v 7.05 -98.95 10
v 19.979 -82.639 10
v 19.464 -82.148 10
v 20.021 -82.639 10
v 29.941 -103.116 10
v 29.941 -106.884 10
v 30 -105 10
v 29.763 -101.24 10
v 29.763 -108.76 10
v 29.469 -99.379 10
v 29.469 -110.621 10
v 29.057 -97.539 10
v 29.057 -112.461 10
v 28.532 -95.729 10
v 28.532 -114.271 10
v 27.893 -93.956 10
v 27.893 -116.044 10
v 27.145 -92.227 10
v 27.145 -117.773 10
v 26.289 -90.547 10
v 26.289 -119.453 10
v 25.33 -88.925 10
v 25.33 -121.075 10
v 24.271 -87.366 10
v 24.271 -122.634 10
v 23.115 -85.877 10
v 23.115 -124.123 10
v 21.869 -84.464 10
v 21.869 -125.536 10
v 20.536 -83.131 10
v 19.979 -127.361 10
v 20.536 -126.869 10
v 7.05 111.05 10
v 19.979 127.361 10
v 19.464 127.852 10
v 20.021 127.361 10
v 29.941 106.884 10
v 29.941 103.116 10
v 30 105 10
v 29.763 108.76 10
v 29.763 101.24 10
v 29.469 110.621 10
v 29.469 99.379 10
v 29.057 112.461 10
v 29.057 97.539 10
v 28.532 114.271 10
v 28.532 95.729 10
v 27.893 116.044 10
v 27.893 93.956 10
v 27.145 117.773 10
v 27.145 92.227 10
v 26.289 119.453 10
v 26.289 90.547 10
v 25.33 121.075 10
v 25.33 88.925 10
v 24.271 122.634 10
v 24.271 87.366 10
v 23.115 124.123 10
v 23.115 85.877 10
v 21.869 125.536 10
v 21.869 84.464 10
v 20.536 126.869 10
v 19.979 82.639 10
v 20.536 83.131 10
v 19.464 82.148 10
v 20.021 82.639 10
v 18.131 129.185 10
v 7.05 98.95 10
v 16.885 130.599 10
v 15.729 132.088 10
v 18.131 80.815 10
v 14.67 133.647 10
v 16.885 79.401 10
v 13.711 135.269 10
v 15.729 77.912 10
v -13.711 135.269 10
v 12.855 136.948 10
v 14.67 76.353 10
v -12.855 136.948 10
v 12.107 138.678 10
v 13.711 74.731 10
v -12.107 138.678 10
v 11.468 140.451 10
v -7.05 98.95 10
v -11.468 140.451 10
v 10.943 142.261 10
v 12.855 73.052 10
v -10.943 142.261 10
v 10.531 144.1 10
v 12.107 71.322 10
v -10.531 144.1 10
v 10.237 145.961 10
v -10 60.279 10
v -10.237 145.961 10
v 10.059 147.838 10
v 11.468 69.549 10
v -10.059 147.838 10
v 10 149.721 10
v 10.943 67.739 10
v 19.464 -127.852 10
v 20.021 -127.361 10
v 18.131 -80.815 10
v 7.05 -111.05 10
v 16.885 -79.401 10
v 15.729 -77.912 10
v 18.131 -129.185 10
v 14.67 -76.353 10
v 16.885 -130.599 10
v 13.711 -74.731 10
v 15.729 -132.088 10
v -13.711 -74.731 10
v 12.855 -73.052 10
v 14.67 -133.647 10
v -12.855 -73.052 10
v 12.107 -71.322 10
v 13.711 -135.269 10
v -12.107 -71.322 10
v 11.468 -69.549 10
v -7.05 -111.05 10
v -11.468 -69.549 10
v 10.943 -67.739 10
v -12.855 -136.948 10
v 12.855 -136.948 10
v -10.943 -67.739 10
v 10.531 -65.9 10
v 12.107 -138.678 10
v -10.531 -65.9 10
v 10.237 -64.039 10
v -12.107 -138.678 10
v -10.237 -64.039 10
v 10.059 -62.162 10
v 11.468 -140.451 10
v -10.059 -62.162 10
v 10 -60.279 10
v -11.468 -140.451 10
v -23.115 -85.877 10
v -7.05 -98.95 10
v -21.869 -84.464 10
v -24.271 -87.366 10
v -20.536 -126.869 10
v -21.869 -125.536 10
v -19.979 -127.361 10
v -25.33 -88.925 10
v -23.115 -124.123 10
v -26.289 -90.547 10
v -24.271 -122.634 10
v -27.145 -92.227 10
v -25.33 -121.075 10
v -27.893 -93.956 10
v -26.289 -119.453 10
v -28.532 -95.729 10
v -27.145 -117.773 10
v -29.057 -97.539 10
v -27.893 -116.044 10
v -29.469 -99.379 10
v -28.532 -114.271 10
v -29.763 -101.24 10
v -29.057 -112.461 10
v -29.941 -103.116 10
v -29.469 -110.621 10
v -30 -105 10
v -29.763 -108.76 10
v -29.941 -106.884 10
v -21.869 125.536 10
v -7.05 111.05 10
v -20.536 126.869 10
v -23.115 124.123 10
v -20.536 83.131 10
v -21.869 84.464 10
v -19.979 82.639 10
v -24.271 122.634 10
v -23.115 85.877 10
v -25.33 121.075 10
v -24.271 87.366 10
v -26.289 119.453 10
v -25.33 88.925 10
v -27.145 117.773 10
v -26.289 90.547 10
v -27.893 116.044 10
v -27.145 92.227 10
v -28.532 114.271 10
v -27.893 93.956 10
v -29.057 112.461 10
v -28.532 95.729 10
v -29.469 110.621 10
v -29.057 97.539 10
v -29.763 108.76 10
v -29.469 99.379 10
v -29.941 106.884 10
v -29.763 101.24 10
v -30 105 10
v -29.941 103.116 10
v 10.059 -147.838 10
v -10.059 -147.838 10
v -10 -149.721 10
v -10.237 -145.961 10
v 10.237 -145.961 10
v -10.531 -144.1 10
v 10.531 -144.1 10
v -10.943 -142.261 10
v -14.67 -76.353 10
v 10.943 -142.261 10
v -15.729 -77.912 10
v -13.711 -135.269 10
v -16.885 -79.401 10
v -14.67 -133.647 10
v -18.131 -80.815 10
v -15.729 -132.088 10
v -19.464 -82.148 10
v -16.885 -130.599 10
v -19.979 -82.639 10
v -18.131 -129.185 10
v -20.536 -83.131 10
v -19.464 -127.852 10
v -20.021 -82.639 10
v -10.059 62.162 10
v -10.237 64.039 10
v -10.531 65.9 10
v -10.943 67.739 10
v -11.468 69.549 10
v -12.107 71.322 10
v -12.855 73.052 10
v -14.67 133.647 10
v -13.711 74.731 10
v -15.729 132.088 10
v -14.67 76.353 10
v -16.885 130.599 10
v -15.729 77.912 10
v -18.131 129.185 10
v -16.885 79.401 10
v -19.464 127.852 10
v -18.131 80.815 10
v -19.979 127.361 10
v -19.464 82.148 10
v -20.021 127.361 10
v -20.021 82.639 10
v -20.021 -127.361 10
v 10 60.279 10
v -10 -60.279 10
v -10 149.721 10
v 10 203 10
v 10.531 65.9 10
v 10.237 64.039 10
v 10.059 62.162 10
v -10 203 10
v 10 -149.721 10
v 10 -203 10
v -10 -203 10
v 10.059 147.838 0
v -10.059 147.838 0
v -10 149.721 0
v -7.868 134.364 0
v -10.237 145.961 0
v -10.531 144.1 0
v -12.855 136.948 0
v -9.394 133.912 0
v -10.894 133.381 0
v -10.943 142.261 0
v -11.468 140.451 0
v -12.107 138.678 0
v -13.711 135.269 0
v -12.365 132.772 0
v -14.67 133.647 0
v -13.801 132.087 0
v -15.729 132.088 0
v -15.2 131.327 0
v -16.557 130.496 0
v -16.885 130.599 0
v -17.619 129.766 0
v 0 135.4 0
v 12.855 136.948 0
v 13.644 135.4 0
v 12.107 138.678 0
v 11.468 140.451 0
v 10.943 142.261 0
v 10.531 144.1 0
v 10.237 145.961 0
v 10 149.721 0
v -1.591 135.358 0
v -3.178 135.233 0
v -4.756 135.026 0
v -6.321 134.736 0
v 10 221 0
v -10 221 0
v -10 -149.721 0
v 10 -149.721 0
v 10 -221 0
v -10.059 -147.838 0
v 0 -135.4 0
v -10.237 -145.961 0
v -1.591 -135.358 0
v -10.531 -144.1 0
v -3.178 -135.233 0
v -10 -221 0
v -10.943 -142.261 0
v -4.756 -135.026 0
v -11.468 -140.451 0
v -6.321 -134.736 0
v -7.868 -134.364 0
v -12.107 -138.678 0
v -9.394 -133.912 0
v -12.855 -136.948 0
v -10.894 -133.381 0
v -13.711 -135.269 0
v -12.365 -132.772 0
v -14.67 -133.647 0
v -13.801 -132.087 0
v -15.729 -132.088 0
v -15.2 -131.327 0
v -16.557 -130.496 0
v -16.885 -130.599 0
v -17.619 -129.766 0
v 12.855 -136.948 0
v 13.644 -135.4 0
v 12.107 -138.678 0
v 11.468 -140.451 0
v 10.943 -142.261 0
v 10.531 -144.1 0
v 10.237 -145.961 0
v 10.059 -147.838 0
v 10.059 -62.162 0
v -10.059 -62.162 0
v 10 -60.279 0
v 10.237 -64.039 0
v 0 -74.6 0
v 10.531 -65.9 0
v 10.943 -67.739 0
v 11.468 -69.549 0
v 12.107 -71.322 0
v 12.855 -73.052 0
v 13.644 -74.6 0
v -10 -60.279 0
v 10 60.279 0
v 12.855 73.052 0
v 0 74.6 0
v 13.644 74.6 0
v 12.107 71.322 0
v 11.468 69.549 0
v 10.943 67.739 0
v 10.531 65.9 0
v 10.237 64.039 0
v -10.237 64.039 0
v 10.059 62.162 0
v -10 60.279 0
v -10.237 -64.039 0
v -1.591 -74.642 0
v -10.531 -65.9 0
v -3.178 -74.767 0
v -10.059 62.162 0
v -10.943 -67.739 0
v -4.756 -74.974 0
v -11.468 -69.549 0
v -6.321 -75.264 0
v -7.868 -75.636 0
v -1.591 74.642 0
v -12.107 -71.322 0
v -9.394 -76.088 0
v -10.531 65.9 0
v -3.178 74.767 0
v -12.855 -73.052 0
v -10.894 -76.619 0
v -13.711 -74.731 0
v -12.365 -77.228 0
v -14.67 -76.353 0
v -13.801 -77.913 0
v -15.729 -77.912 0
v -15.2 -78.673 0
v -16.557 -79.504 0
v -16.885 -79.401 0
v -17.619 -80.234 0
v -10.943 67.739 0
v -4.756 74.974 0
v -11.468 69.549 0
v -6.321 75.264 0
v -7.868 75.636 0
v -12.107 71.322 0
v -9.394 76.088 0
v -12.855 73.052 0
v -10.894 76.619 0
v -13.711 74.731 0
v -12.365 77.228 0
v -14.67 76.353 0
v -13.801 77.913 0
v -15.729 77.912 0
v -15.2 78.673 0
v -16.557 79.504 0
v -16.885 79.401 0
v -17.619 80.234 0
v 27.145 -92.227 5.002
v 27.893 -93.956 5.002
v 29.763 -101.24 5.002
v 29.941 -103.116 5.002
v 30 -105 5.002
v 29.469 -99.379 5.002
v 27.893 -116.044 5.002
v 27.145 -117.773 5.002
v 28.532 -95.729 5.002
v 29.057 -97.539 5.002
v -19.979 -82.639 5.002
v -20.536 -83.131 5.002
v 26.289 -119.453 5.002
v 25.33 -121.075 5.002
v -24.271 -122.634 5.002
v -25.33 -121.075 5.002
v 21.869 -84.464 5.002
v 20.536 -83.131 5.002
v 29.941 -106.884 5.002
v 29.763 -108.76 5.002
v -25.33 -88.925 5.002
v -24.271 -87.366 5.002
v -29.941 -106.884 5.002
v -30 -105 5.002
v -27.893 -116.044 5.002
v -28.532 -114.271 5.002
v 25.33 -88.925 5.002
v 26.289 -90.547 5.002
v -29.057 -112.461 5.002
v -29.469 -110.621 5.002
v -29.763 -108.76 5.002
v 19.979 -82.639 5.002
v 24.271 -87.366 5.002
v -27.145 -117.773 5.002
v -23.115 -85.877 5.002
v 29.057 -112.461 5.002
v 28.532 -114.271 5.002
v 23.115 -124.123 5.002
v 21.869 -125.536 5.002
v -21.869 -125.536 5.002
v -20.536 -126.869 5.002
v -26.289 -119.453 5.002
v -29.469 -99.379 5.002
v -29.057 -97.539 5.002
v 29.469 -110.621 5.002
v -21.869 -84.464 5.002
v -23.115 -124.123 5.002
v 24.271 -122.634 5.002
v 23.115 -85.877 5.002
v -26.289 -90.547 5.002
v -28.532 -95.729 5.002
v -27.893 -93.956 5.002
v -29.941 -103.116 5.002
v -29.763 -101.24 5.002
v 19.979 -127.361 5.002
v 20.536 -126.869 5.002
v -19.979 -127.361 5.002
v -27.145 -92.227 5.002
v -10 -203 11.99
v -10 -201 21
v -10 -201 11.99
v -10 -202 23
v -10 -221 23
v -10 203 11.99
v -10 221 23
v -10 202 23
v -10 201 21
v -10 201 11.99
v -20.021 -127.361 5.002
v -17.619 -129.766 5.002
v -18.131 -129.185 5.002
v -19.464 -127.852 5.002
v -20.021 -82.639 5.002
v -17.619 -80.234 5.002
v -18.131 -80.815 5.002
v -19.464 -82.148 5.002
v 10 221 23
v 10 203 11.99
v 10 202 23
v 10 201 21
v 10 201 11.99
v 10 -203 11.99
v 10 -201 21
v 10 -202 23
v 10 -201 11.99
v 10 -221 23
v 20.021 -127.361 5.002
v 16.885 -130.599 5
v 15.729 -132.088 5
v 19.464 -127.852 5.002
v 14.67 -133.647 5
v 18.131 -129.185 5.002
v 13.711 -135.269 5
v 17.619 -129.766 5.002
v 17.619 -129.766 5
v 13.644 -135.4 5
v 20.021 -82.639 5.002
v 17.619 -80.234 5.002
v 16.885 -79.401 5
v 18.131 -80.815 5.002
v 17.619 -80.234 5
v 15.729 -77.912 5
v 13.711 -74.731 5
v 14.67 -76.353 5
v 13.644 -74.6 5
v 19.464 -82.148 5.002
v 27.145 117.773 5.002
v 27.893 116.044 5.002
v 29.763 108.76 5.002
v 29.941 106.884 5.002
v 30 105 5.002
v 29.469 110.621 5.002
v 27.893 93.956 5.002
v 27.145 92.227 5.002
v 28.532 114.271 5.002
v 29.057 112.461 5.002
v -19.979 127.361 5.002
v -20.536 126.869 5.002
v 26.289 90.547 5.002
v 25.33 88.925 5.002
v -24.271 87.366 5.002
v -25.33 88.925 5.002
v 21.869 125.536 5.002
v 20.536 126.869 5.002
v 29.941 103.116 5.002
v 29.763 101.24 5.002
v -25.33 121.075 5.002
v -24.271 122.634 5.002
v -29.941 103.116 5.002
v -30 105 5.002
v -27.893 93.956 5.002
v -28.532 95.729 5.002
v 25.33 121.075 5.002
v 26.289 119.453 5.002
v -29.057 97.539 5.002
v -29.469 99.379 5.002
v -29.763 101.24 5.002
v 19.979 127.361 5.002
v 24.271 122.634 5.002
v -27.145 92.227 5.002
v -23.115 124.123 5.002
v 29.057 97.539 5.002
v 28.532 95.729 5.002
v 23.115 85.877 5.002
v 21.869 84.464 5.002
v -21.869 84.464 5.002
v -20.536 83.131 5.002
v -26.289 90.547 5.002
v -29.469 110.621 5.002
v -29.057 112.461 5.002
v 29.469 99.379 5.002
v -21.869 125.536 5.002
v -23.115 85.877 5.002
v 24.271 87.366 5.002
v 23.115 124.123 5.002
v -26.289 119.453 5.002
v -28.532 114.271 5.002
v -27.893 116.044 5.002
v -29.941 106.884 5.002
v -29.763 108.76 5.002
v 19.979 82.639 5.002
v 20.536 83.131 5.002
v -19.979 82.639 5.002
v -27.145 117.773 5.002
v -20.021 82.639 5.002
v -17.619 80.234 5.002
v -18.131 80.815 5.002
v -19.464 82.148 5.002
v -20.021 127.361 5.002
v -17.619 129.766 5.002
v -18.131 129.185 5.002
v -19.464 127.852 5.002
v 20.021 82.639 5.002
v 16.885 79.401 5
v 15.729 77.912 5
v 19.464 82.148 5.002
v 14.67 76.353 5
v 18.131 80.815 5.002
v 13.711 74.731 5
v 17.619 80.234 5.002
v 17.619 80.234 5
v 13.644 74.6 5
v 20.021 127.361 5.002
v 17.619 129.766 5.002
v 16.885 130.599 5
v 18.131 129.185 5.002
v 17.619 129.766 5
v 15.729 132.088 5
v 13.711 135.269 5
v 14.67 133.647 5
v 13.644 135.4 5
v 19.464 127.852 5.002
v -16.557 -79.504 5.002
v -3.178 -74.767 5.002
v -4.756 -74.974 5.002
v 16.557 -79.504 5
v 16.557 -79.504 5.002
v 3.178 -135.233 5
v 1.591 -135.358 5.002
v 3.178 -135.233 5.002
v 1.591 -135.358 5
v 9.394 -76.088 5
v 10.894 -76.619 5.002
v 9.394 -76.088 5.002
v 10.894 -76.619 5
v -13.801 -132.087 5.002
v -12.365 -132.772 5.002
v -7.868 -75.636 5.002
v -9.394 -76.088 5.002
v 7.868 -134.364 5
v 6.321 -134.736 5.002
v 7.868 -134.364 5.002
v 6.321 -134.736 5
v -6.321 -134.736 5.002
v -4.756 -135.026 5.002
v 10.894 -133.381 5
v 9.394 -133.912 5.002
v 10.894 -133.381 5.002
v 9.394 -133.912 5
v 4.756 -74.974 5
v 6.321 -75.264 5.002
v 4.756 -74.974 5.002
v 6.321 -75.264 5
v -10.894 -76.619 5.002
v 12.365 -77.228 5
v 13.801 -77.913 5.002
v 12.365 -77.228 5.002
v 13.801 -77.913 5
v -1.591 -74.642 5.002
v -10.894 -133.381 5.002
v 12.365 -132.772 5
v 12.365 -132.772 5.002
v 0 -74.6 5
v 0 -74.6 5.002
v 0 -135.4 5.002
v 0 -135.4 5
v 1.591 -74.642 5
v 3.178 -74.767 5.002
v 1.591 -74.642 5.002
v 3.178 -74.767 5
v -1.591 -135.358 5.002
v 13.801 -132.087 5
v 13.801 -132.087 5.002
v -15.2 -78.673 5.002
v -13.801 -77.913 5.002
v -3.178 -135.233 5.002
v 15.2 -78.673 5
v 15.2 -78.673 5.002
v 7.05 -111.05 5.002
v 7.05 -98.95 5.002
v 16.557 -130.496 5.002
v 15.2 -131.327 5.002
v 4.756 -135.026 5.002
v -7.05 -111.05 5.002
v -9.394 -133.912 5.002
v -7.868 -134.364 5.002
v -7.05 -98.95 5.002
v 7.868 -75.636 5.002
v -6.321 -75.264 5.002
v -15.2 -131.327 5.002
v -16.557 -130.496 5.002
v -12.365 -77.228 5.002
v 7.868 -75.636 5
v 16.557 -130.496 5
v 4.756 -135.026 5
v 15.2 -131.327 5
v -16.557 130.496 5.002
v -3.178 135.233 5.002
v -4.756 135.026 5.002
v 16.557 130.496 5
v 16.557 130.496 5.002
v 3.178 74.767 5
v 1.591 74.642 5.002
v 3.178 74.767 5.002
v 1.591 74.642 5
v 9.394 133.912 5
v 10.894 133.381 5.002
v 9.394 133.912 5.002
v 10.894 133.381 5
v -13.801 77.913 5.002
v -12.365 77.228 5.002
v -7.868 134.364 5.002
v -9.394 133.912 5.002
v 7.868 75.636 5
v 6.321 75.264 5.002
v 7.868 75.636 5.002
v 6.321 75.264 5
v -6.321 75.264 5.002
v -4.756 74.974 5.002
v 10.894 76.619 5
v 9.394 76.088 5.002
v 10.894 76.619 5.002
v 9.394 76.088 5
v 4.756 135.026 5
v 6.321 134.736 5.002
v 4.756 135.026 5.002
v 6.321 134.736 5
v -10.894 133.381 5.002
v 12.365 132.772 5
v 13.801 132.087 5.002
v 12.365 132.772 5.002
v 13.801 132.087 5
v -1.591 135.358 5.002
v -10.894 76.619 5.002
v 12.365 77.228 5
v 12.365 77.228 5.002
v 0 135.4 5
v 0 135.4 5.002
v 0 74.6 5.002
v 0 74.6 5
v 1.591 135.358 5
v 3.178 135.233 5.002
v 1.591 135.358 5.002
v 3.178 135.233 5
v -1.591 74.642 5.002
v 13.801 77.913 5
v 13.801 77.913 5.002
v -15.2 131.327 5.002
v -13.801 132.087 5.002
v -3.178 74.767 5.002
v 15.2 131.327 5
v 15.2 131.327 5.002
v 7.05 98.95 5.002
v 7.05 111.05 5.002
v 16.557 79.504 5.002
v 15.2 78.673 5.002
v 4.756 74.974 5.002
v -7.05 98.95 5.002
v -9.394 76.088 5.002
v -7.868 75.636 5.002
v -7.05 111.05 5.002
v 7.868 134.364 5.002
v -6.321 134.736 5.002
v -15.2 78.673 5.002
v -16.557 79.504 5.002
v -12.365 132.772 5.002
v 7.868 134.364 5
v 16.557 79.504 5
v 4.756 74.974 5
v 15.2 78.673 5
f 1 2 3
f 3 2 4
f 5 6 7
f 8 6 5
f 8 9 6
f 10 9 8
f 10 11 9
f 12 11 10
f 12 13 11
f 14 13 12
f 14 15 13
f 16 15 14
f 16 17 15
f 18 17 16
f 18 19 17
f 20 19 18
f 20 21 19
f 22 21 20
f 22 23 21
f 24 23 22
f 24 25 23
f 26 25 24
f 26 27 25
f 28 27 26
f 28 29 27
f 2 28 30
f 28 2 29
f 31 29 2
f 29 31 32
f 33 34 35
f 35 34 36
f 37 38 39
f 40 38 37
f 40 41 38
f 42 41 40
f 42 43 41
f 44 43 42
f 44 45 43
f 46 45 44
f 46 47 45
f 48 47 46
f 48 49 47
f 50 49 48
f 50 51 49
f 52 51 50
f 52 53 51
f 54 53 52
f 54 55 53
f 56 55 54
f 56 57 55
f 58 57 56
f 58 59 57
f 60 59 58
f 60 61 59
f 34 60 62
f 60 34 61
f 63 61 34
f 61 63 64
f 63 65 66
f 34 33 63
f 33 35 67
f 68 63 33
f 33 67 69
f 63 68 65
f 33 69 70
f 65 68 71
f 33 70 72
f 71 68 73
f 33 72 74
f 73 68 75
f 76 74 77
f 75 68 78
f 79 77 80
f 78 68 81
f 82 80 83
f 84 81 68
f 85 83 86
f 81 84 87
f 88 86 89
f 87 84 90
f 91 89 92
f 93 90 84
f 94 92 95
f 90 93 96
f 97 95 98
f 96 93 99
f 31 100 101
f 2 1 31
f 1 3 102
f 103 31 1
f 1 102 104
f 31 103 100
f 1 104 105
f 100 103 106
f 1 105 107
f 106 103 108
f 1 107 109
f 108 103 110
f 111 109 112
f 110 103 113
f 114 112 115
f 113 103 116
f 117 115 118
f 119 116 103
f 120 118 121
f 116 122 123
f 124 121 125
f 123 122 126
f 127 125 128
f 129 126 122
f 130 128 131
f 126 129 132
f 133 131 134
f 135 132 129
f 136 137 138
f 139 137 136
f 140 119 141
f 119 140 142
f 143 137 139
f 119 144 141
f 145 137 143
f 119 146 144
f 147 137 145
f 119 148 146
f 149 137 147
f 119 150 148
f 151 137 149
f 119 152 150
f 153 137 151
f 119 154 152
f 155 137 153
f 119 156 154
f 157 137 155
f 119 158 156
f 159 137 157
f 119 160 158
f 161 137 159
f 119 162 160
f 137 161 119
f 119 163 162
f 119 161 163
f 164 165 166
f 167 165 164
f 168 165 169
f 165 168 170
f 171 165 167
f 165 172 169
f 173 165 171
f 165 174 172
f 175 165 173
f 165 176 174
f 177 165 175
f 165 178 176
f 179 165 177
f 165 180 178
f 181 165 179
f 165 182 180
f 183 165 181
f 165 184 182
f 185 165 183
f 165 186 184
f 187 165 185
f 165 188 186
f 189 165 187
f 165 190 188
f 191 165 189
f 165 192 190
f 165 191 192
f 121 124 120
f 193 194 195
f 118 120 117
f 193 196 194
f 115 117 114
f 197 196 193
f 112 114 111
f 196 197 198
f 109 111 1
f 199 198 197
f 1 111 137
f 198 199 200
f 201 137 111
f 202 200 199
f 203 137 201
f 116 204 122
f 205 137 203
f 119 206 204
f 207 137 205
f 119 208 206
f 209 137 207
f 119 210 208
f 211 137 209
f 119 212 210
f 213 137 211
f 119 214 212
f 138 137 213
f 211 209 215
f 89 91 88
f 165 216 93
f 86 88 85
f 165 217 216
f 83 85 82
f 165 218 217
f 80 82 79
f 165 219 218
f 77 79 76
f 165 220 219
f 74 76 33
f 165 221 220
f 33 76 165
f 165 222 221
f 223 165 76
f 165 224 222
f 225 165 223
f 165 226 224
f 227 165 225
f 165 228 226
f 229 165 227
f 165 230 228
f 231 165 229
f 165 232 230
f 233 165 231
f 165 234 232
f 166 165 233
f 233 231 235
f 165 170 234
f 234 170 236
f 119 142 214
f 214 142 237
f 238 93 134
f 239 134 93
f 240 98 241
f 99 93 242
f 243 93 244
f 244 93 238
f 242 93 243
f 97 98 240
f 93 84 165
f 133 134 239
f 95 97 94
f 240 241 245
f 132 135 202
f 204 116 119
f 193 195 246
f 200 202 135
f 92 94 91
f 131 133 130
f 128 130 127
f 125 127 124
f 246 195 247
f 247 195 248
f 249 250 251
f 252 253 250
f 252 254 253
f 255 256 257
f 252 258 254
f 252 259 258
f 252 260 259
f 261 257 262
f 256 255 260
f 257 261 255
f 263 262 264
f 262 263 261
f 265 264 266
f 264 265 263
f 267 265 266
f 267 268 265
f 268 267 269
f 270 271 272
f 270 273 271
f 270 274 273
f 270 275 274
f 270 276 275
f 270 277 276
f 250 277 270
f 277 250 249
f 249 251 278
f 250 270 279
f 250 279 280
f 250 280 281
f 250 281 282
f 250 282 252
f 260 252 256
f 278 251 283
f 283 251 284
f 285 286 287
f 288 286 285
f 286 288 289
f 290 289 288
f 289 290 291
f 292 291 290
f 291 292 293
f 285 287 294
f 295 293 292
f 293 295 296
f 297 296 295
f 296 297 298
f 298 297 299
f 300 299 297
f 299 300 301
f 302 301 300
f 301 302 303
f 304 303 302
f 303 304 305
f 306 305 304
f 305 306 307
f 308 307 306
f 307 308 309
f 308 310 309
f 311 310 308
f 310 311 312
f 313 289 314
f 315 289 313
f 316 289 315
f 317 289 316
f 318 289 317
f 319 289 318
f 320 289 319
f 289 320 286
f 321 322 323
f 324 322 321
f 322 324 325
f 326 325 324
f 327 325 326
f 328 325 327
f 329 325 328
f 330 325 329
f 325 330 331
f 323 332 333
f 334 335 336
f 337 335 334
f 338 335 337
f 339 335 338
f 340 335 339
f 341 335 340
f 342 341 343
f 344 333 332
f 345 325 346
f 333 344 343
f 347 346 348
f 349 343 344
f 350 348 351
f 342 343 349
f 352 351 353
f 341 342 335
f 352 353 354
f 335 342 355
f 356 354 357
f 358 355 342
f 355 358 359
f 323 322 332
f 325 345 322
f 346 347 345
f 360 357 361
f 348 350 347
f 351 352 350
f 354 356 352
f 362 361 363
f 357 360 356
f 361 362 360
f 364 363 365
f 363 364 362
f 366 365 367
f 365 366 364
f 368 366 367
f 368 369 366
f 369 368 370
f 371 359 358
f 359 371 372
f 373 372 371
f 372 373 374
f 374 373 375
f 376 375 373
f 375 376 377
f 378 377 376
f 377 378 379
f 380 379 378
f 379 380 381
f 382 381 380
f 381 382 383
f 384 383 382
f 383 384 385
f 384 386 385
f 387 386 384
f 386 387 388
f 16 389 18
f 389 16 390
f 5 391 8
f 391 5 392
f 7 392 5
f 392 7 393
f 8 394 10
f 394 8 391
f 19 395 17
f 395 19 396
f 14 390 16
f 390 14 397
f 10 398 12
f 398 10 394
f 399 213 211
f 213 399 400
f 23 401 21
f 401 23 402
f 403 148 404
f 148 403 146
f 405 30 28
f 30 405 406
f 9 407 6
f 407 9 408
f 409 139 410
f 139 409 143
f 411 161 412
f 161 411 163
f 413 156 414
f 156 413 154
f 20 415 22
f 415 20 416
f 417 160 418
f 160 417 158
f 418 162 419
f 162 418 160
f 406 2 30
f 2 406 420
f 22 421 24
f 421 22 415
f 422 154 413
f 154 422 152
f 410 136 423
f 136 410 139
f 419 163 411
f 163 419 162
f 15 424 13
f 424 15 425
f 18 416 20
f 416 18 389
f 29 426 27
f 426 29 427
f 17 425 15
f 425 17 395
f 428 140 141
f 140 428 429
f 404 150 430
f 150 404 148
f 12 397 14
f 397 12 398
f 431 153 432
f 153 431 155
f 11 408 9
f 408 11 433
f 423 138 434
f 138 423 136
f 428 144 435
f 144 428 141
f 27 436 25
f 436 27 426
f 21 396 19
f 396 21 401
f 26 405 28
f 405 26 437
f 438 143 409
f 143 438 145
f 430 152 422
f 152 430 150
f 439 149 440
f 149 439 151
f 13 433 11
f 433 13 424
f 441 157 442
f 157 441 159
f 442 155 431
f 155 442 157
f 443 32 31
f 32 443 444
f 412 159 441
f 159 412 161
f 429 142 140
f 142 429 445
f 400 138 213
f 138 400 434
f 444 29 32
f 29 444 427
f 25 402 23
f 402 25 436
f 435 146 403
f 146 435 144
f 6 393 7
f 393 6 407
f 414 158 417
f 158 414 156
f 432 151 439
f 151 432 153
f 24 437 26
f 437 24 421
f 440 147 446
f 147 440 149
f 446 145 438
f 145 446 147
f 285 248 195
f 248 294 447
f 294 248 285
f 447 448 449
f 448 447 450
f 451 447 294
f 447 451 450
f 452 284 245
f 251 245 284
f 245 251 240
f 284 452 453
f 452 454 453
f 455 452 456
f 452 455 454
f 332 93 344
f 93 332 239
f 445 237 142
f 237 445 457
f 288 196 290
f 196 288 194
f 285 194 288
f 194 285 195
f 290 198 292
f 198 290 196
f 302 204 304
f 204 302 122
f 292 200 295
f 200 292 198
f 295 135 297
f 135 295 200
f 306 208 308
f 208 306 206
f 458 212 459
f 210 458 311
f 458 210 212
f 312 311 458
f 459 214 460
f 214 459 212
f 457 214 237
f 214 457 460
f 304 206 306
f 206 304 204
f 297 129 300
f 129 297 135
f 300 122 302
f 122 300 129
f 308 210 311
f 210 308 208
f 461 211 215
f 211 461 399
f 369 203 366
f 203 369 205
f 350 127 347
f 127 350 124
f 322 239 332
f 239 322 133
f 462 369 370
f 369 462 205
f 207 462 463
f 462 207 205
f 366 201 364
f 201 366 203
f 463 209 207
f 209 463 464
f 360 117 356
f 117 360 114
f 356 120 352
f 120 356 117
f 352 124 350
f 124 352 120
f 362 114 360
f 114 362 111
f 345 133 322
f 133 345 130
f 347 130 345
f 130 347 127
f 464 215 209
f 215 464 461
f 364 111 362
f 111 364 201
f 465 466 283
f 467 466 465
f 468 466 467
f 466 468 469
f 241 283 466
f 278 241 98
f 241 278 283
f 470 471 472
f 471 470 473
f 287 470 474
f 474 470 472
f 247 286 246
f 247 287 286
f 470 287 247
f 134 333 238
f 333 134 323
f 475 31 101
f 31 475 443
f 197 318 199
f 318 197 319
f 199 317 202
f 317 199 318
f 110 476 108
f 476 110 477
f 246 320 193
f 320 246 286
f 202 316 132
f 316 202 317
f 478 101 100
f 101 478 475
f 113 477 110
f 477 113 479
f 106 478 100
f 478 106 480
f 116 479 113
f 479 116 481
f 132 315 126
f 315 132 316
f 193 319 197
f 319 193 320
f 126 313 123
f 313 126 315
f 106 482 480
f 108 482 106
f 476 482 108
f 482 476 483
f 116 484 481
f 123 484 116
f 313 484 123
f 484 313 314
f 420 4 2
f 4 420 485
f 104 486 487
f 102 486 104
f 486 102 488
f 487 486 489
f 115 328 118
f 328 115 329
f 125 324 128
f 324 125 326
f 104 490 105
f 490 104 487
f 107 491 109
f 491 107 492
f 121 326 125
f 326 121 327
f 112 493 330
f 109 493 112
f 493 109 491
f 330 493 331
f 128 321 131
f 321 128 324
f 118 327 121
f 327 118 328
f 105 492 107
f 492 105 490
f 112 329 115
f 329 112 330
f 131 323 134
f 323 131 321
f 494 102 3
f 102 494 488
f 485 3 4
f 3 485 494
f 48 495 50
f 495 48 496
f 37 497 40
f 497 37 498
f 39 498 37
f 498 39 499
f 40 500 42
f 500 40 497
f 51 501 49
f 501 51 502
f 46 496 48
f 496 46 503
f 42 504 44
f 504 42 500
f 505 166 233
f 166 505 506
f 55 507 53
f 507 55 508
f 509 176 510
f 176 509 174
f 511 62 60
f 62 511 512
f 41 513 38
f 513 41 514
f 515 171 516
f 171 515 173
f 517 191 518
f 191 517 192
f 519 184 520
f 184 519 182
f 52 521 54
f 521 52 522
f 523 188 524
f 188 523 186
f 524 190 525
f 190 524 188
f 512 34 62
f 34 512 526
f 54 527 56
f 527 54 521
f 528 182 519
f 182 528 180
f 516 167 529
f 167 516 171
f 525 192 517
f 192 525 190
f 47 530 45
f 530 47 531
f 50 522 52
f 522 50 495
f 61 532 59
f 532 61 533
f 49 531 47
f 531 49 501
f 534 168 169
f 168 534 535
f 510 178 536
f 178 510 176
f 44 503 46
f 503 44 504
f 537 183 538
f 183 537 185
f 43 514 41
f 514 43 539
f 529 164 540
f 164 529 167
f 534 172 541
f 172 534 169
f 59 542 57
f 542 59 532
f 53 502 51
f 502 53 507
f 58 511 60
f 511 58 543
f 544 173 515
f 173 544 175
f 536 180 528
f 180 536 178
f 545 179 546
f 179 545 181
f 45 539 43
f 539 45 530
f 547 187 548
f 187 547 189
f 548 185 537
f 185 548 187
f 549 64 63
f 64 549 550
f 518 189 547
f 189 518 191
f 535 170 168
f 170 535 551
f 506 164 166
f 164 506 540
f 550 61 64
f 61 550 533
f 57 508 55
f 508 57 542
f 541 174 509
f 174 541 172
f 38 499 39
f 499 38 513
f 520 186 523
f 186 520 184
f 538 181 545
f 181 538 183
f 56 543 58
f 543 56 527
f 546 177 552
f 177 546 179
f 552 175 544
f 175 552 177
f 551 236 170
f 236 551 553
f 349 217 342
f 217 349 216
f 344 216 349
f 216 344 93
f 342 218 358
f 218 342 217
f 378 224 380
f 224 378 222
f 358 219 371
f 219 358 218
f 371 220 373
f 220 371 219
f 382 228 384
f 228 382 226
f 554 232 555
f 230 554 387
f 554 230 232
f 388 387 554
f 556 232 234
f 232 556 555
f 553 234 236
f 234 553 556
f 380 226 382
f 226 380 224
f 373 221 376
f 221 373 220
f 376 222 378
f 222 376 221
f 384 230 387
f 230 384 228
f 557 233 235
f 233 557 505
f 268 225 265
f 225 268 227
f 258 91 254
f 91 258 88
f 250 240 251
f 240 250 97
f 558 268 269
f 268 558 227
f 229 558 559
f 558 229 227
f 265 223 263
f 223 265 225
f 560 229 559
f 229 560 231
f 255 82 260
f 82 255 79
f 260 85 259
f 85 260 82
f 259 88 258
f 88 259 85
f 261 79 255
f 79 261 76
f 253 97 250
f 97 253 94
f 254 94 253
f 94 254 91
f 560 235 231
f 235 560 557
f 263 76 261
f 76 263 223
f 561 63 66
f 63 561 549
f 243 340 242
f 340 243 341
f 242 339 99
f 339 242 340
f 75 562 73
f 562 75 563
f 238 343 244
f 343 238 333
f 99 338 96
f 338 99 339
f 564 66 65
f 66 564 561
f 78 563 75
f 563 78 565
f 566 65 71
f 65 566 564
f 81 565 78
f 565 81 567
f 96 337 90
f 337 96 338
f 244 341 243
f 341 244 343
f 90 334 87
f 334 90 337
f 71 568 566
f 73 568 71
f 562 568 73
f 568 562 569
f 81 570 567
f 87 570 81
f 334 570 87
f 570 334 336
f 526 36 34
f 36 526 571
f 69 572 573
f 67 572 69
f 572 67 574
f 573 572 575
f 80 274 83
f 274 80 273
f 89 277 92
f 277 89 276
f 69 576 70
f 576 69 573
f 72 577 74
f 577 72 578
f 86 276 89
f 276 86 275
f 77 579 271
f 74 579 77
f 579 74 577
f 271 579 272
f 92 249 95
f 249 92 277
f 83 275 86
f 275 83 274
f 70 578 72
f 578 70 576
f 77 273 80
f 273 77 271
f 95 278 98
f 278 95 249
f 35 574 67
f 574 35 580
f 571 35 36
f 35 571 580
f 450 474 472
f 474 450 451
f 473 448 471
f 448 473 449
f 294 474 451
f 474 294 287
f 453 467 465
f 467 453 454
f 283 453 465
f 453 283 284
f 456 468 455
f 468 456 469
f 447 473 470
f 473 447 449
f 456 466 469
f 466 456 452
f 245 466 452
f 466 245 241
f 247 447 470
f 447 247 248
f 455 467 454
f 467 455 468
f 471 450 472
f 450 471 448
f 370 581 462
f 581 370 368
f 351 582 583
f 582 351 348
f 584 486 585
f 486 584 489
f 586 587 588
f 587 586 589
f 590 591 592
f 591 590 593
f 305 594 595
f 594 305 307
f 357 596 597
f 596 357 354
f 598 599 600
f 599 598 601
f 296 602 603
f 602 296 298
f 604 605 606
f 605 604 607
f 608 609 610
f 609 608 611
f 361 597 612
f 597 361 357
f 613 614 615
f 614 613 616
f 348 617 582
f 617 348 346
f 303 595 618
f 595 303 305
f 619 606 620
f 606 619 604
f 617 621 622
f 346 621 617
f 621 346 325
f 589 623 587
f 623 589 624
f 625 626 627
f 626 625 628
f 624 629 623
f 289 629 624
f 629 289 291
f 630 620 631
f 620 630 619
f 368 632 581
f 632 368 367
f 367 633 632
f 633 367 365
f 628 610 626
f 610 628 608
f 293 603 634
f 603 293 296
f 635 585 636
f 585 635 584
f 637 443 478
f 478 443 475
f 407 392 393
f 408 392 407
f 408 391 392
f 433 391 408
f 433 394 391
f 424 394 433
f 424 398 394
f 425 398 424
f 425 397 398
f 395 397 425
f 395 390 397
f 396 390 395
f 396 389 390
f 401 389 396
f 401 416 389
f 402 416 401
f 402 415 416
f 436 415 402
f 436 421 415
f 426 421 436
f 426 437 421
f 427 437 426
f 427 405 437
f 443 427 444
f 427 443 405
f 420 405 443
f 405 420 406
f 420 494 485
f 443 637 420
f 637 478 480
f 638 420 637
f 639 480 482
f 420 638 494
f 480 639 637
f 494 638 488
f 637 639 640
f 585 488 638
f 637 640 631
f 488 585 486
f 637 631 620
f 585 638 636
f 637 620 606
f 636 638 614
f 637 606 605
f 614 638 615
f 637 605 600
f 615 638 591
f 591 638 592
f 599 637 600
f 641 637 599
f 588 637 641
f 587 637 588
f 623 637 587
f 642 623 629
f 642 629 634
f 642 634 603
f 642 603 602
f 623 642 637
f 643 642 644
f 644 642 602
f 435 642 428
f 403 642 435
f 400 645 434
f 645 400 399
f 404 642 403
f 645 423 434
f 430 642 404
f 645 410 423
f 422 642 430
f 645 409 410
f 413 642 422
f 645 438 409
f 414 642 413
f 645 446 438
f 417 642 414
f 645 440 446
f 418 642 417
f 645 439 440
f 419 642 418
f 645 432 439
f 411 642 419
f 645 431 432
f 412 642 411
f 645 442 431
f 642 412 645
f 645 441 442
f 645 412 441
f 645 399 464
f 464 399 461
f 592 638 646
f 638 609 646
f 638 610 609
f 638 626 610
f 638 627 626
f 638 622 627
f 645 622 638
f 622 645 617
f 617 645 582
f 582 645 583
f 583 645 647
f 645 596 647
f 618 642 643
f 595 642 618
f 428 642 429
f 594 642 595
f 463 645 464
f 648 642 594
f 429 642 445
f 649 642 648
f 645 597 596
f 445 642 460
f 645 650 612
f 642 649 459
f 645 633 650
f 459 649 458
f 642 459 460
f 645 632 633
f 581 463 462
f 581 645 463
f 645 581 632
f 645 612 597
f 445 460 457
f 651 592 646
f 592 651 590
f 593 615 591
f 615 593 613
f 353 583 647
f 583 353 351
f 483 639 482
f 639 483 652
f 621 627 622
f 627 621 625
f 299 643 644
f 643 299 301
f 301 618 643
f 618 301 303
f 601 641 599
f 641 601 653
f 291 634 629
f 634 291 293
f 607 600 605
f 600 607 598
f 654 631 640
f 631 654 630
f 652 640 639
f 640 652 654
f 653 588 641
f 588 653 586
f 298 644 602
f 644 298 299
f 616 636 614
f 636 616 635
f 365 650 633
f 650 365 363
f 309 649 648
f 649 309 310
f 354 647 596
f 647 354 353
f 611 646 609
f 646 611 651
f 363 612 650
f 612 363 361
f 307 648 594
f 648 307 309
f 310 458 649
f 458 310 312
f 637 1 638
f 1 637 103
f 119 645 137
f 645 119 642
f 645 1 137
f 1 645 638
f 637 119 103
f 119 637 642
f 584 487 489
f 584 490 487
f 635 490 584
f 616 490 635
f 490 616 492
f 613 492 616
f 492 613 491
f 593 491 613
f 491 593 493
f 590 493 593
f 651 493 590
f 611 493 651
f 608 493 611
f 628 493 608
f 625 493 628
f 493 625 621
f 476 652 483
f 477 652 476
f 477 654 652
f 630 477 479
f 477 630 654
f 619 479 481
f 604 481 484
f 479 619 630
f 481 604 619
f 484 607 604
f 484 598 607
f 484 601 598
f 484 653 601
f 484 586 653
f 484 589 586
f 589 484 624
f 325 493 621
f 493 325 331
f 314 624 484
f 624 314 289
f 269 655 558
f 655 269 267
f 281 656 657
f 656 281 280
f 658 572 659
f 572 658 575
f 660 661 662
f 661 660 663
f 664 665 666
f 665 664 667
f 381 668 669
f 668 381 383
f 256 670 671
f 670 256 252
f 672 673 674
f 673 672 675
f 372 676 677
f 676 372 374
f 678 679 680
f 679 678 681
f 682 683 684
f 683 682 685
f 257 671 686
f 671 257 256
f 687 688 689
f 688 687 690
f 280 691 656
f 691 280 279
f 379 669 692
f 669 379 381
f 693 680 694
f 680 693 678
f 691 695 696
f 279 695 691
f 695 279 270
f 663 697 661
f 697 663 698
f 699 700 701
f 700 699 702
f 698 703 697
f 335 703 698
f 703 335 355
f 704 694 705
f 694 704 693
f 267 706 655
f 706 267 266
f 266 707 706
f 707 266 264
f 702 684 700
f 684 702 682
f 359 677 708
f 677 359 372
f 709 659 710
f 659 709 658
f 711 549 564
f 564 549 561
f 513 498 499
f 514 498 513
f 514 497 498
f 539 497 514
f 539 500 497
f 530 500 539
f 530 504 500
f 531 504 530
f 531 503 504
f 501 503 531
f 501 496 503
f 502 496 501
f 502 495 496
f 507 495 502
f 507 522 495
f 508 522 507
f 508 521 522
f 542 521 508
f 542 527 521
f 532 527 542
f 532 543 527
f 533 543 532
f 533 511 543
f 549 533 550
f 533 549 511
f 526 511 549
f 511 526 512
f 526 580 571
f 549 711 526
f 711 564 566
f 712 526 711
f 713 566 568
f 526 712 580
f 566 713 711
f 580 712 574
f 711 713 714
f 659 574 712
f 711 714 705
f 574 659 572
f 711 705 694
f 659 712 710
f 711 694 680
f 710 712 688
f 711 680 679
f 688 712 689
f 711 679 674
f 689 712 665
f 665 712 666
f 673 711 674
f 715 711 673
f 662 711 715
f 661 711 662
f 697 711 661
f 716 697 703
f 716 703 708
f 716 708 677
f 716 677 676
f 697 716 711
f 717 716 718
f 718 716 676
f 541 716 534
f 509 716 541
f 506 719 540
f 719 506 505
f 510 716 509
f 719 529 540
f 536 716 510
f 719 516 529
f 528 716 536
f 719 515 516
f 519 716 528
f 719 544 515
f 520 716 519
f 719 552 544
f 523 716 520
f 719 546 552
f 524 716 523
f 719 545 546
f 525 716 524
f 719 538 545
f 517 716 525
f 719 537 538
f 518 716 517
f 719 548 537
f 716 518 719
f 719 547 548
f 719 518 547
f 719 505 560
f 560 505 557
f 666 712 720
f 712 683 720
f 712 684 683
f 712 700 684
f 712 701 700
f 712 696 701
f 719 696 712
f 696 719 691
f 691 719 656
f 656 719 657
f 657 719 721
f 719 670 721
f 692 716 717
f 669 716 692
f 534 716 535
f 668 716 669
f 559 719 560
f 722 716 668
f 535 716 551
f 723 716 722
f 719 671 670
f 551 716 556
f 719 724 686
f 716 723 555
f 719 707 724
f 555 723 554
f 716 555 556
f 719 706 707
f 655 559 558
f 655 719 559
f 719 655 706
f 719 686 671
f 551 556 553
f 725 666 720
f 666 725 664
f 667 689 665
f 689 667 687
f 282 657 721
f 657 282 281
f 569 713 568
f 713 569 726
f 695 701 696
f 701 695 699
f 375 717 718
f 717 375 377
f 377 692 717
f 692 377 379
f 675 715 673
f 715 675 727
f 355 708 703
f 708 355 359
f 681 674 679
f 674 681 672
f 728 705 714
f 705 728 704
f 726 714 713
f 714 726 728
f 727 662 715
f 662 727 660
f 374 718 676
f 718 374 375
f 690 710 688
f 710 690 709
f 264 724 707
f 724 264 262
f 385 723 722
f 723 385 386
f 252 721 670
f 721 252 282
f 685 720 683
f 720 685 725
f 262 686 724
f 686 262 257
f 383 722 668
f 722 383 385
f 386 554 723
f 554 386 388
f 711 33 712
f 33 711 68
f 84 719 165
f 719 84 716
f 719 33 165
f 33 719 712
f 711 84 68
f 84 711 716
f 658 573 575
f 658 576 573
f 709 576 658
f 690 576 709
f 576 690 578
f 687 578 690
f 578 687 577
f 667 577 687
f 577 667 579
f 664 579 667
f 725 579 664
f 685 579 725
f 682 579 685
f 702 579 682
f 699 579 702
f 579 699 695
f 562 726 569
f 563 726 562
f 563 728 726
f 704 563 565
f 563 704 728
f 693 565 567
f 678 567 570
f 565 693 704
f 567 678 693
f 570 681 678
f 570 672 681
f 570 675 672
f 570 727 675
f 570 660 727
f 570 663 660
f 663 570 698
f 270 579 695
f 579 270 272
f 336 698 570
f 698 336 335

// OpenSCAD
depth = 402;
width = 402;

thickness = 20;
height = 10;

total_bed_height = 11;
constrained_bed_height = 9;

heater_pad_gap = 2;

ease_in_width = 1;
ease_in_height = 2;

screw_offset_x = 185;
screw_offset_y = 105;
screw_hole_diameter = 12;

screw_diameter = 3;

module bar(bar_length, interface_side, crossing_offset, remove_outside_curved_wall)
{
  translate([0, 0, height * 0.5])
  union()
  {
    difference()
    {
      // rounding:
      // * middle circle diameter = 3 * thickness
      // * corner circles diameter = 3 * thickness
      
      intersection()
      {
        union()
        {
          cube([thickness, bar_length + 2 * thickness, height], center = true);
          
          rounding_circle_radius = 1.5 * thickness;
          
          for (bulge_y = [-crossing_offset, crossing_offset])
            translate([0, bulge_y, 0])
            {
              intersection()
              {
                cube([3 * thickness, 3 * thickness, height], center = true);
                cylinder(height + 0.2, rounding_circle_radius, rounding_circle_radius, center = true, $fn = 100);
              }

              rounding_x = 0.5 * thickness + rounding_circle_radius;
              rounding_y = sqrt(4 * rounding_circle_radius * rounding_circle_radius - rounding_x * rounding_x);

              for (dx = [-1, 1])
                for (dy = [-1, 1])
                  difference()
                  {
                    translate([dx * (0.5 * rounding_circle_radius + 0.5 * thickness), dy * rounding_y * 0.75, 0])
                    cube([rounding_circle_radius, 0.5 * rounding_y, height], center = true);
                    
                    translate([dx * rounding_x, dy * rounding_y, 0])
                    cylinder(height + 2.1, rounding_circle_radius, rounding_circle_radius, center = true, $fn = 100);
                  }
            }

          difference()
          {
            union()
            {
              translate([0, -bar_length * 0.5 - thickness * 0.5, 0.5 * total_bed_height + 0.5 * ease_in_height])
              cube([thickness, thickness, height + total_bed_height + ease_in_height], center = true);

              translate([0, bar_length * 0.5 + thickness * 0.5, 0.5 * total_bed_height + 0.5 * ease_in_height])
              cube([thickness, thickness, height + total_bed_height + ease_in_height], center = true);
            }
            
            translate([0, 0, 0.5 * height + 0.5 * (total_bed_height - constrained_bed_height) - 0.01])
            cube([2 * thickness, bar_length + 2 * heater_pad_gap, total_bed_height - constrained_bed_height], center = true);
           
            translate([0, 0, 0.5 * height + total_bed_height])
            multmatrix(
              [[1, 0, 0, -thickness],
               [0, 1, ease_in_width / ease_in_height, -0.5 * bar_length],
               [0, 0, 1, 0],
               [0, 0, 0, 1]])
            {
              cube([2 * thickness, bar_length, ease_in_height]);
            }

            translate([0, 0, 0.5 * height + total_bed_height])
            multmatrix(
              [[1, 0, 0, -thickness],
               [0, 1, -ease_in_width / ease_in_height, -0.5 * bar_length],
               [0, 0, 1, 0],
               [0, 0, 0, 1]])
            {
              cube([2 * thickness, bar_length, ease_in_height]);
            }
          }
        }
        
        cube([4 * thickness, bar_length + 2 * thickness, 4 * height], center = true);
      }
      
      for (translation = [-crossing_offset, +crossing_offset])
      {
        translate([0, translation, 0])
        {
          translate([0, 0, height * 0.25 * interface_side])
          cylinder(height * 0.5004, 1.52 * thickness, 1.52 * thickness, center = true, $fn = 120);
          
          rotate([0, 0, 45 + 45 * interface_side])
          cube([14.1, 12.1, height * 2], center = true);
          
          if (remove_outside_curved_wall)
          {
            translate([1.52 * thickness, 0, -height])
            cube([3.04 * thickness, 3.04 * thickness, height * 2], center = true);
          }
        }
      }

      if (crossing_offset + 1.5 * thickness > 0.5 * bar_length - thickness)
      {
        for (slide_in_x_index = [0 : thickness : 4])
        {
          slide_in_base = 3 * thickness - 0.5 * slide_in_x_index;

          slide_in_x = crossing_offset - 1.5 * thickness + slide_in_base;
          slide_in_y = 0.5 * height;
          
          angle = atan2(slide_in_y, slide_in_base);
          
          translate([0, -slide_in_x, 0])
          rotate([angle, 0, 0])
          translate([0, 1.52 * thickness, 0])
          cylinder(0.5 * height, 1.52 * thickness, 1.52 * thickness, $fn = 120);

          rotate([0, 0, 180])
          translate([0, -slide_in_x, 0])
          rotate([angle, 0, 0])
          translate([0, 1.52 * thickness, 0])
          cylinder(0.5 * height, 1.52 * thickness, 1.52 * thickness, $fn = 120);
        }
      }
    }
  }
}

xs = $preview ? [-screw_offset_x, +screw_offset_x] : [0];
ys = $preview ? [-screw_offset_y, +screw_offset_y] : [0];

//*/
color([1, 0.3, 0.6])
for (x = xs)
  translate([x, 0, 0])
    bar(depth, -1, screw_offset_y, true);
/*/
color([0.3, 1, 0.6])
for (y = ys)
  translate([0, y, 0.1])
    rotate([0, 0, 90])
      bar(depth, 1, screw_offset_x, false);
/**/

color([0, 0, 0])
if ($preview)
{
  for (y_offset = [-screw_offset_y, +screw_offset_y])
  {
    translate([0, y_offset, 0])
    difference()
    {
      translate([0, 0, -5])
      cube([600, 10, 10], center = true);
      
      translate([screw_offset_x, 0, -13])
      cylinder(30, screw_diameter * 0.5, screw_diameter * 0.5, $fn = 20);
      
      translate([-screw_offset_x, 0, -13])
      cylinder(30, screw_diameter * 0.5, screw_diameter * 0.5, $fn = 20);
    }
  }
}
